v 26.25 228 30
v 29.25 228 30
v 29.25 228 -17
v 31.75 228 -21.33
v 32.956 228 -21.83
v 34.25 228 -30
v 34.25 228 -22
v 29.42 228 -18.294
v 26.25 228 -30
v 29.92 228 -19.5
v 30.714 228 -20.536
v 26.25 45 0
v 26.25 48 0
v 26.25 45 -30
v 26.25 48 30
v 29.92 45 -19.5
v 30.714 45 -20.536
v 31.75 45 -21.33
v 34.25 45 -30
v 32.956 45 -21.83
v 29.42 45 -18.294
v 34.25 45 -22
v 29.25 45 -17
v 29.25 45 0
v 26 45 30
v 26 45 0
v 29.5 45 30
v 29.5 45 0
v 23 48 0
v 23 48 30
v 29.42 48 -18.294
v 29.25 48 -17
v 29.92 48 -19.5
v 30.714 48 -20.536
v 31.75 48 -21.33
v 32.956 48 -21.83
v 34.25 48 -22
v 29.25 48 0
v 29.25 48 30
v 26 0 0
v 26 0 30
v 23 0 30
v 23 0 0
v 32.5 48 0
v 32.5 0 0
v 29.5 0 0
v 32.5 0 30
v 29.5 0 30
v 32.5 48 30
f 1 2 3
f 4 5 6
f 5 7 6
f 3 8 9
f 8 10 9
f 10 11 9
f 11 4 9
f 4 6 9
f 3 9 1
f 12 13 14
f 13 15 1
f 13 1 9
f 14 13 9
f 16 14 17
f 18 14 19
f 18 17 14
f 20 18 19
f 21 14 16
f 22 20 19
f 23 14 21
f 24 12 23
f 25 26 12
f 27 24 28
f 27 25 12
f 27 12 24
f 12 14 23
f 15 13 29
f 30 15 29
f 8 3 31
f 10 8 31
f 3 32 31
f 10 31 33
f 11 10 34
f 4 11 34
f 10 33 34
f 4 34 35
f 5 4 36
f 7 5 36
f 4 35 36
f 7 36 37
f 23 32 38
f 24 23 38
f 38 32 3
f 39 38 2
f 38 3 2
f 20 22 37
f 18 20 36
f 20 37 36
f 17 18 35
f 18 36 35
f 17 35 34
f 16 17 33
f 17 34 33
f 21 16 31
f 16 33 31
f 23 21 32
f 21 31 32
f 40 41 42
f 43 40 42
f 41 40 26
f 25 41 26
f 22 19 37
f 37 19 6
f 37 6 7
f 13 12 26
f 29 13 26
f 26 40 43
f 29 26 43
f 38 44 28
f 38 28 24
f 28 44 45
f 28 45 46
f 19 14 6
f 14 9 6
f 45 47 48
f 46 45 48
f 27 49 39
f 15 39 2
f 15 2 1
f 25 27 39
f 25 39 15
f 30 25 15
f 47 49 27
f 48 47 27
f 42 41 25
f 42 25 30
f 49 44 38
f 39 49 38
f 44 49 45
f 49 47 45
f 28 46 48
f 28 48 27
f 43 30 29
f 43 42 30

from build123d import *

# Parameters (mm, degrees)
SKETCH_1_W          = 3
SKETCH_1_H          = 45
EXTRUDE_1_DEPTH     = 30
EXTRUDE_1_2_DEPTH   = 30
SKETCH_2_W          = 9.5
SKETCH_2_H          = 30
EXTRUDE_2_DEPTH     = 3
SKETCH_3_W          = 3
SKETCH_3_H          = 60
EXTRUDE_3_DEPTH     = 180
SKETCH_4_W          = 5
SKETCH_4_H          = 8
EXTRUDE_4_DEPTH     = 180
FILLET_4_R          = 5
CUT_EXTRUDE_START   = -18
SKETCH_5_W          = 60.08866788
SKETCH_5_H          = 228
CUT_EXTRUDE_1_DEPTH = 11.25
EXTRUDE_5_DEPTH     = 3


with BuildPart() as part:
    # 草图1 → 凸台-拉伸1 (new body)
    with BuildSketch(Plane.XY):
        with Locations((1.5, 22.5)):
            Rectangle(SKETCH_1_W, SKETCH_1_H)
    extrude(amount=EXTRUDE_1_DEPTH)



with BuildPart() as body_2:
    # 草图1 → Extrude 1 2 (new body)
    with BuildSketch(Plane.XY):
        with Locations((8, 22.5)):
            Rectangle(SKETCH_1_W, SKETCH_1_H)
    extrude(amount=EXTRUDE_1_2_DEPTH)


with BuildPart() as part_1:
    add(part.part)

    add(body_2.part)  # 凸台-拉伸2 merges body 2
    # 草图2 → 凸台-拉伸2 (add)
    with BuildSketch(Plane(origin=(0, 45, 0), x_dir=(1, 0, 0), z_dir=(0, 1, 0))):
        with Locations((4.75, -15)):
            Rectangle(SKETCH_2_W, SKETCH_2_H)
    extrude(amount=EXTRUDE_2_DEPTH)

    # 草图3 → 凸台-拉伸3 (add)
    with BuildSketch(Plane(origin=(0, 48, 0), x_dir=(1, 0, 0), z_dir=(0, 1, 0))):
        with Locations((4.75, 0)):
            Rectangle(SKETCH_3_W, SKETCH_3_H)
    extrude(amount=EXTRUDE_3_DEPTH)

    # 草图4 → 凸台-拉伸4 (add)
    with BuildSketch(Plane(origin=(0, 228, 0), x_dir=(1, 0, 0), z_dir=(0, 1, 0))):
        with Locations((0.75, 26)):
            Rectangle(SKETCH_4_W, SKETCH_4_H)
    extrude(amount=-EXTRUDE_4_DEPTH)

    # 圆角4
    fillet_4_edges = [part_1.edges().sort_by_distance(p)[0] for p in [
        (3.25, 138, -22),
    ]]
    fillet(fillet_4_edges, radius=FILLET_4_R - 0.0001)  # a hair under: the kernel refuses the full size


with BuildPart() as body_2_2:
    # 镜向3: mirrored copy
    add(part_1.part.mirror(Plane(origin=(16.25, 0, 0), x_dir=(0, 0, 1), z_dir=(1, 0, 0))))

    # 草图6 → 凸台-拉伸5 (add)
    with BuildSketch(Plane.XZ.offset(-48)):
        with BuildLine():
            Line((26.25, 0), (26.25, -30))
            Line((26.25, -30), (34.25, -30))
            Line((34.25, -30), (34.25, -22))
            ThreePointArc((34.25, -22), (30.714466094, -20.535533906), (29.25, -17))
            Line((29.25, -17), (29.25, 0))
            Line((29.25, 0), (26.25, 0))
        make_face()
    extrude(amount=EXTRUDE_5_DEPTH)


with BuildPart() as part_2:
    add(part_1.part)

    # 草图5 → 切除-拉伸1 (cut)
    with BuildSketch(Plane(origin=(16.25, 0, 0), x_dir=(0, 0, -1), z_dir=(1, 0, 0)).offset(CUT_EXTRUDE_START)):
        with Locations((0.04433394, 114)):
            Rectangle(SKETCH_5_W, SKETCH_5_H)
    extrude(amount=CUT_EXTRUDE_1_DEPTH, mode=Mode.SUBTRACT)


solid = body_2_2.part
